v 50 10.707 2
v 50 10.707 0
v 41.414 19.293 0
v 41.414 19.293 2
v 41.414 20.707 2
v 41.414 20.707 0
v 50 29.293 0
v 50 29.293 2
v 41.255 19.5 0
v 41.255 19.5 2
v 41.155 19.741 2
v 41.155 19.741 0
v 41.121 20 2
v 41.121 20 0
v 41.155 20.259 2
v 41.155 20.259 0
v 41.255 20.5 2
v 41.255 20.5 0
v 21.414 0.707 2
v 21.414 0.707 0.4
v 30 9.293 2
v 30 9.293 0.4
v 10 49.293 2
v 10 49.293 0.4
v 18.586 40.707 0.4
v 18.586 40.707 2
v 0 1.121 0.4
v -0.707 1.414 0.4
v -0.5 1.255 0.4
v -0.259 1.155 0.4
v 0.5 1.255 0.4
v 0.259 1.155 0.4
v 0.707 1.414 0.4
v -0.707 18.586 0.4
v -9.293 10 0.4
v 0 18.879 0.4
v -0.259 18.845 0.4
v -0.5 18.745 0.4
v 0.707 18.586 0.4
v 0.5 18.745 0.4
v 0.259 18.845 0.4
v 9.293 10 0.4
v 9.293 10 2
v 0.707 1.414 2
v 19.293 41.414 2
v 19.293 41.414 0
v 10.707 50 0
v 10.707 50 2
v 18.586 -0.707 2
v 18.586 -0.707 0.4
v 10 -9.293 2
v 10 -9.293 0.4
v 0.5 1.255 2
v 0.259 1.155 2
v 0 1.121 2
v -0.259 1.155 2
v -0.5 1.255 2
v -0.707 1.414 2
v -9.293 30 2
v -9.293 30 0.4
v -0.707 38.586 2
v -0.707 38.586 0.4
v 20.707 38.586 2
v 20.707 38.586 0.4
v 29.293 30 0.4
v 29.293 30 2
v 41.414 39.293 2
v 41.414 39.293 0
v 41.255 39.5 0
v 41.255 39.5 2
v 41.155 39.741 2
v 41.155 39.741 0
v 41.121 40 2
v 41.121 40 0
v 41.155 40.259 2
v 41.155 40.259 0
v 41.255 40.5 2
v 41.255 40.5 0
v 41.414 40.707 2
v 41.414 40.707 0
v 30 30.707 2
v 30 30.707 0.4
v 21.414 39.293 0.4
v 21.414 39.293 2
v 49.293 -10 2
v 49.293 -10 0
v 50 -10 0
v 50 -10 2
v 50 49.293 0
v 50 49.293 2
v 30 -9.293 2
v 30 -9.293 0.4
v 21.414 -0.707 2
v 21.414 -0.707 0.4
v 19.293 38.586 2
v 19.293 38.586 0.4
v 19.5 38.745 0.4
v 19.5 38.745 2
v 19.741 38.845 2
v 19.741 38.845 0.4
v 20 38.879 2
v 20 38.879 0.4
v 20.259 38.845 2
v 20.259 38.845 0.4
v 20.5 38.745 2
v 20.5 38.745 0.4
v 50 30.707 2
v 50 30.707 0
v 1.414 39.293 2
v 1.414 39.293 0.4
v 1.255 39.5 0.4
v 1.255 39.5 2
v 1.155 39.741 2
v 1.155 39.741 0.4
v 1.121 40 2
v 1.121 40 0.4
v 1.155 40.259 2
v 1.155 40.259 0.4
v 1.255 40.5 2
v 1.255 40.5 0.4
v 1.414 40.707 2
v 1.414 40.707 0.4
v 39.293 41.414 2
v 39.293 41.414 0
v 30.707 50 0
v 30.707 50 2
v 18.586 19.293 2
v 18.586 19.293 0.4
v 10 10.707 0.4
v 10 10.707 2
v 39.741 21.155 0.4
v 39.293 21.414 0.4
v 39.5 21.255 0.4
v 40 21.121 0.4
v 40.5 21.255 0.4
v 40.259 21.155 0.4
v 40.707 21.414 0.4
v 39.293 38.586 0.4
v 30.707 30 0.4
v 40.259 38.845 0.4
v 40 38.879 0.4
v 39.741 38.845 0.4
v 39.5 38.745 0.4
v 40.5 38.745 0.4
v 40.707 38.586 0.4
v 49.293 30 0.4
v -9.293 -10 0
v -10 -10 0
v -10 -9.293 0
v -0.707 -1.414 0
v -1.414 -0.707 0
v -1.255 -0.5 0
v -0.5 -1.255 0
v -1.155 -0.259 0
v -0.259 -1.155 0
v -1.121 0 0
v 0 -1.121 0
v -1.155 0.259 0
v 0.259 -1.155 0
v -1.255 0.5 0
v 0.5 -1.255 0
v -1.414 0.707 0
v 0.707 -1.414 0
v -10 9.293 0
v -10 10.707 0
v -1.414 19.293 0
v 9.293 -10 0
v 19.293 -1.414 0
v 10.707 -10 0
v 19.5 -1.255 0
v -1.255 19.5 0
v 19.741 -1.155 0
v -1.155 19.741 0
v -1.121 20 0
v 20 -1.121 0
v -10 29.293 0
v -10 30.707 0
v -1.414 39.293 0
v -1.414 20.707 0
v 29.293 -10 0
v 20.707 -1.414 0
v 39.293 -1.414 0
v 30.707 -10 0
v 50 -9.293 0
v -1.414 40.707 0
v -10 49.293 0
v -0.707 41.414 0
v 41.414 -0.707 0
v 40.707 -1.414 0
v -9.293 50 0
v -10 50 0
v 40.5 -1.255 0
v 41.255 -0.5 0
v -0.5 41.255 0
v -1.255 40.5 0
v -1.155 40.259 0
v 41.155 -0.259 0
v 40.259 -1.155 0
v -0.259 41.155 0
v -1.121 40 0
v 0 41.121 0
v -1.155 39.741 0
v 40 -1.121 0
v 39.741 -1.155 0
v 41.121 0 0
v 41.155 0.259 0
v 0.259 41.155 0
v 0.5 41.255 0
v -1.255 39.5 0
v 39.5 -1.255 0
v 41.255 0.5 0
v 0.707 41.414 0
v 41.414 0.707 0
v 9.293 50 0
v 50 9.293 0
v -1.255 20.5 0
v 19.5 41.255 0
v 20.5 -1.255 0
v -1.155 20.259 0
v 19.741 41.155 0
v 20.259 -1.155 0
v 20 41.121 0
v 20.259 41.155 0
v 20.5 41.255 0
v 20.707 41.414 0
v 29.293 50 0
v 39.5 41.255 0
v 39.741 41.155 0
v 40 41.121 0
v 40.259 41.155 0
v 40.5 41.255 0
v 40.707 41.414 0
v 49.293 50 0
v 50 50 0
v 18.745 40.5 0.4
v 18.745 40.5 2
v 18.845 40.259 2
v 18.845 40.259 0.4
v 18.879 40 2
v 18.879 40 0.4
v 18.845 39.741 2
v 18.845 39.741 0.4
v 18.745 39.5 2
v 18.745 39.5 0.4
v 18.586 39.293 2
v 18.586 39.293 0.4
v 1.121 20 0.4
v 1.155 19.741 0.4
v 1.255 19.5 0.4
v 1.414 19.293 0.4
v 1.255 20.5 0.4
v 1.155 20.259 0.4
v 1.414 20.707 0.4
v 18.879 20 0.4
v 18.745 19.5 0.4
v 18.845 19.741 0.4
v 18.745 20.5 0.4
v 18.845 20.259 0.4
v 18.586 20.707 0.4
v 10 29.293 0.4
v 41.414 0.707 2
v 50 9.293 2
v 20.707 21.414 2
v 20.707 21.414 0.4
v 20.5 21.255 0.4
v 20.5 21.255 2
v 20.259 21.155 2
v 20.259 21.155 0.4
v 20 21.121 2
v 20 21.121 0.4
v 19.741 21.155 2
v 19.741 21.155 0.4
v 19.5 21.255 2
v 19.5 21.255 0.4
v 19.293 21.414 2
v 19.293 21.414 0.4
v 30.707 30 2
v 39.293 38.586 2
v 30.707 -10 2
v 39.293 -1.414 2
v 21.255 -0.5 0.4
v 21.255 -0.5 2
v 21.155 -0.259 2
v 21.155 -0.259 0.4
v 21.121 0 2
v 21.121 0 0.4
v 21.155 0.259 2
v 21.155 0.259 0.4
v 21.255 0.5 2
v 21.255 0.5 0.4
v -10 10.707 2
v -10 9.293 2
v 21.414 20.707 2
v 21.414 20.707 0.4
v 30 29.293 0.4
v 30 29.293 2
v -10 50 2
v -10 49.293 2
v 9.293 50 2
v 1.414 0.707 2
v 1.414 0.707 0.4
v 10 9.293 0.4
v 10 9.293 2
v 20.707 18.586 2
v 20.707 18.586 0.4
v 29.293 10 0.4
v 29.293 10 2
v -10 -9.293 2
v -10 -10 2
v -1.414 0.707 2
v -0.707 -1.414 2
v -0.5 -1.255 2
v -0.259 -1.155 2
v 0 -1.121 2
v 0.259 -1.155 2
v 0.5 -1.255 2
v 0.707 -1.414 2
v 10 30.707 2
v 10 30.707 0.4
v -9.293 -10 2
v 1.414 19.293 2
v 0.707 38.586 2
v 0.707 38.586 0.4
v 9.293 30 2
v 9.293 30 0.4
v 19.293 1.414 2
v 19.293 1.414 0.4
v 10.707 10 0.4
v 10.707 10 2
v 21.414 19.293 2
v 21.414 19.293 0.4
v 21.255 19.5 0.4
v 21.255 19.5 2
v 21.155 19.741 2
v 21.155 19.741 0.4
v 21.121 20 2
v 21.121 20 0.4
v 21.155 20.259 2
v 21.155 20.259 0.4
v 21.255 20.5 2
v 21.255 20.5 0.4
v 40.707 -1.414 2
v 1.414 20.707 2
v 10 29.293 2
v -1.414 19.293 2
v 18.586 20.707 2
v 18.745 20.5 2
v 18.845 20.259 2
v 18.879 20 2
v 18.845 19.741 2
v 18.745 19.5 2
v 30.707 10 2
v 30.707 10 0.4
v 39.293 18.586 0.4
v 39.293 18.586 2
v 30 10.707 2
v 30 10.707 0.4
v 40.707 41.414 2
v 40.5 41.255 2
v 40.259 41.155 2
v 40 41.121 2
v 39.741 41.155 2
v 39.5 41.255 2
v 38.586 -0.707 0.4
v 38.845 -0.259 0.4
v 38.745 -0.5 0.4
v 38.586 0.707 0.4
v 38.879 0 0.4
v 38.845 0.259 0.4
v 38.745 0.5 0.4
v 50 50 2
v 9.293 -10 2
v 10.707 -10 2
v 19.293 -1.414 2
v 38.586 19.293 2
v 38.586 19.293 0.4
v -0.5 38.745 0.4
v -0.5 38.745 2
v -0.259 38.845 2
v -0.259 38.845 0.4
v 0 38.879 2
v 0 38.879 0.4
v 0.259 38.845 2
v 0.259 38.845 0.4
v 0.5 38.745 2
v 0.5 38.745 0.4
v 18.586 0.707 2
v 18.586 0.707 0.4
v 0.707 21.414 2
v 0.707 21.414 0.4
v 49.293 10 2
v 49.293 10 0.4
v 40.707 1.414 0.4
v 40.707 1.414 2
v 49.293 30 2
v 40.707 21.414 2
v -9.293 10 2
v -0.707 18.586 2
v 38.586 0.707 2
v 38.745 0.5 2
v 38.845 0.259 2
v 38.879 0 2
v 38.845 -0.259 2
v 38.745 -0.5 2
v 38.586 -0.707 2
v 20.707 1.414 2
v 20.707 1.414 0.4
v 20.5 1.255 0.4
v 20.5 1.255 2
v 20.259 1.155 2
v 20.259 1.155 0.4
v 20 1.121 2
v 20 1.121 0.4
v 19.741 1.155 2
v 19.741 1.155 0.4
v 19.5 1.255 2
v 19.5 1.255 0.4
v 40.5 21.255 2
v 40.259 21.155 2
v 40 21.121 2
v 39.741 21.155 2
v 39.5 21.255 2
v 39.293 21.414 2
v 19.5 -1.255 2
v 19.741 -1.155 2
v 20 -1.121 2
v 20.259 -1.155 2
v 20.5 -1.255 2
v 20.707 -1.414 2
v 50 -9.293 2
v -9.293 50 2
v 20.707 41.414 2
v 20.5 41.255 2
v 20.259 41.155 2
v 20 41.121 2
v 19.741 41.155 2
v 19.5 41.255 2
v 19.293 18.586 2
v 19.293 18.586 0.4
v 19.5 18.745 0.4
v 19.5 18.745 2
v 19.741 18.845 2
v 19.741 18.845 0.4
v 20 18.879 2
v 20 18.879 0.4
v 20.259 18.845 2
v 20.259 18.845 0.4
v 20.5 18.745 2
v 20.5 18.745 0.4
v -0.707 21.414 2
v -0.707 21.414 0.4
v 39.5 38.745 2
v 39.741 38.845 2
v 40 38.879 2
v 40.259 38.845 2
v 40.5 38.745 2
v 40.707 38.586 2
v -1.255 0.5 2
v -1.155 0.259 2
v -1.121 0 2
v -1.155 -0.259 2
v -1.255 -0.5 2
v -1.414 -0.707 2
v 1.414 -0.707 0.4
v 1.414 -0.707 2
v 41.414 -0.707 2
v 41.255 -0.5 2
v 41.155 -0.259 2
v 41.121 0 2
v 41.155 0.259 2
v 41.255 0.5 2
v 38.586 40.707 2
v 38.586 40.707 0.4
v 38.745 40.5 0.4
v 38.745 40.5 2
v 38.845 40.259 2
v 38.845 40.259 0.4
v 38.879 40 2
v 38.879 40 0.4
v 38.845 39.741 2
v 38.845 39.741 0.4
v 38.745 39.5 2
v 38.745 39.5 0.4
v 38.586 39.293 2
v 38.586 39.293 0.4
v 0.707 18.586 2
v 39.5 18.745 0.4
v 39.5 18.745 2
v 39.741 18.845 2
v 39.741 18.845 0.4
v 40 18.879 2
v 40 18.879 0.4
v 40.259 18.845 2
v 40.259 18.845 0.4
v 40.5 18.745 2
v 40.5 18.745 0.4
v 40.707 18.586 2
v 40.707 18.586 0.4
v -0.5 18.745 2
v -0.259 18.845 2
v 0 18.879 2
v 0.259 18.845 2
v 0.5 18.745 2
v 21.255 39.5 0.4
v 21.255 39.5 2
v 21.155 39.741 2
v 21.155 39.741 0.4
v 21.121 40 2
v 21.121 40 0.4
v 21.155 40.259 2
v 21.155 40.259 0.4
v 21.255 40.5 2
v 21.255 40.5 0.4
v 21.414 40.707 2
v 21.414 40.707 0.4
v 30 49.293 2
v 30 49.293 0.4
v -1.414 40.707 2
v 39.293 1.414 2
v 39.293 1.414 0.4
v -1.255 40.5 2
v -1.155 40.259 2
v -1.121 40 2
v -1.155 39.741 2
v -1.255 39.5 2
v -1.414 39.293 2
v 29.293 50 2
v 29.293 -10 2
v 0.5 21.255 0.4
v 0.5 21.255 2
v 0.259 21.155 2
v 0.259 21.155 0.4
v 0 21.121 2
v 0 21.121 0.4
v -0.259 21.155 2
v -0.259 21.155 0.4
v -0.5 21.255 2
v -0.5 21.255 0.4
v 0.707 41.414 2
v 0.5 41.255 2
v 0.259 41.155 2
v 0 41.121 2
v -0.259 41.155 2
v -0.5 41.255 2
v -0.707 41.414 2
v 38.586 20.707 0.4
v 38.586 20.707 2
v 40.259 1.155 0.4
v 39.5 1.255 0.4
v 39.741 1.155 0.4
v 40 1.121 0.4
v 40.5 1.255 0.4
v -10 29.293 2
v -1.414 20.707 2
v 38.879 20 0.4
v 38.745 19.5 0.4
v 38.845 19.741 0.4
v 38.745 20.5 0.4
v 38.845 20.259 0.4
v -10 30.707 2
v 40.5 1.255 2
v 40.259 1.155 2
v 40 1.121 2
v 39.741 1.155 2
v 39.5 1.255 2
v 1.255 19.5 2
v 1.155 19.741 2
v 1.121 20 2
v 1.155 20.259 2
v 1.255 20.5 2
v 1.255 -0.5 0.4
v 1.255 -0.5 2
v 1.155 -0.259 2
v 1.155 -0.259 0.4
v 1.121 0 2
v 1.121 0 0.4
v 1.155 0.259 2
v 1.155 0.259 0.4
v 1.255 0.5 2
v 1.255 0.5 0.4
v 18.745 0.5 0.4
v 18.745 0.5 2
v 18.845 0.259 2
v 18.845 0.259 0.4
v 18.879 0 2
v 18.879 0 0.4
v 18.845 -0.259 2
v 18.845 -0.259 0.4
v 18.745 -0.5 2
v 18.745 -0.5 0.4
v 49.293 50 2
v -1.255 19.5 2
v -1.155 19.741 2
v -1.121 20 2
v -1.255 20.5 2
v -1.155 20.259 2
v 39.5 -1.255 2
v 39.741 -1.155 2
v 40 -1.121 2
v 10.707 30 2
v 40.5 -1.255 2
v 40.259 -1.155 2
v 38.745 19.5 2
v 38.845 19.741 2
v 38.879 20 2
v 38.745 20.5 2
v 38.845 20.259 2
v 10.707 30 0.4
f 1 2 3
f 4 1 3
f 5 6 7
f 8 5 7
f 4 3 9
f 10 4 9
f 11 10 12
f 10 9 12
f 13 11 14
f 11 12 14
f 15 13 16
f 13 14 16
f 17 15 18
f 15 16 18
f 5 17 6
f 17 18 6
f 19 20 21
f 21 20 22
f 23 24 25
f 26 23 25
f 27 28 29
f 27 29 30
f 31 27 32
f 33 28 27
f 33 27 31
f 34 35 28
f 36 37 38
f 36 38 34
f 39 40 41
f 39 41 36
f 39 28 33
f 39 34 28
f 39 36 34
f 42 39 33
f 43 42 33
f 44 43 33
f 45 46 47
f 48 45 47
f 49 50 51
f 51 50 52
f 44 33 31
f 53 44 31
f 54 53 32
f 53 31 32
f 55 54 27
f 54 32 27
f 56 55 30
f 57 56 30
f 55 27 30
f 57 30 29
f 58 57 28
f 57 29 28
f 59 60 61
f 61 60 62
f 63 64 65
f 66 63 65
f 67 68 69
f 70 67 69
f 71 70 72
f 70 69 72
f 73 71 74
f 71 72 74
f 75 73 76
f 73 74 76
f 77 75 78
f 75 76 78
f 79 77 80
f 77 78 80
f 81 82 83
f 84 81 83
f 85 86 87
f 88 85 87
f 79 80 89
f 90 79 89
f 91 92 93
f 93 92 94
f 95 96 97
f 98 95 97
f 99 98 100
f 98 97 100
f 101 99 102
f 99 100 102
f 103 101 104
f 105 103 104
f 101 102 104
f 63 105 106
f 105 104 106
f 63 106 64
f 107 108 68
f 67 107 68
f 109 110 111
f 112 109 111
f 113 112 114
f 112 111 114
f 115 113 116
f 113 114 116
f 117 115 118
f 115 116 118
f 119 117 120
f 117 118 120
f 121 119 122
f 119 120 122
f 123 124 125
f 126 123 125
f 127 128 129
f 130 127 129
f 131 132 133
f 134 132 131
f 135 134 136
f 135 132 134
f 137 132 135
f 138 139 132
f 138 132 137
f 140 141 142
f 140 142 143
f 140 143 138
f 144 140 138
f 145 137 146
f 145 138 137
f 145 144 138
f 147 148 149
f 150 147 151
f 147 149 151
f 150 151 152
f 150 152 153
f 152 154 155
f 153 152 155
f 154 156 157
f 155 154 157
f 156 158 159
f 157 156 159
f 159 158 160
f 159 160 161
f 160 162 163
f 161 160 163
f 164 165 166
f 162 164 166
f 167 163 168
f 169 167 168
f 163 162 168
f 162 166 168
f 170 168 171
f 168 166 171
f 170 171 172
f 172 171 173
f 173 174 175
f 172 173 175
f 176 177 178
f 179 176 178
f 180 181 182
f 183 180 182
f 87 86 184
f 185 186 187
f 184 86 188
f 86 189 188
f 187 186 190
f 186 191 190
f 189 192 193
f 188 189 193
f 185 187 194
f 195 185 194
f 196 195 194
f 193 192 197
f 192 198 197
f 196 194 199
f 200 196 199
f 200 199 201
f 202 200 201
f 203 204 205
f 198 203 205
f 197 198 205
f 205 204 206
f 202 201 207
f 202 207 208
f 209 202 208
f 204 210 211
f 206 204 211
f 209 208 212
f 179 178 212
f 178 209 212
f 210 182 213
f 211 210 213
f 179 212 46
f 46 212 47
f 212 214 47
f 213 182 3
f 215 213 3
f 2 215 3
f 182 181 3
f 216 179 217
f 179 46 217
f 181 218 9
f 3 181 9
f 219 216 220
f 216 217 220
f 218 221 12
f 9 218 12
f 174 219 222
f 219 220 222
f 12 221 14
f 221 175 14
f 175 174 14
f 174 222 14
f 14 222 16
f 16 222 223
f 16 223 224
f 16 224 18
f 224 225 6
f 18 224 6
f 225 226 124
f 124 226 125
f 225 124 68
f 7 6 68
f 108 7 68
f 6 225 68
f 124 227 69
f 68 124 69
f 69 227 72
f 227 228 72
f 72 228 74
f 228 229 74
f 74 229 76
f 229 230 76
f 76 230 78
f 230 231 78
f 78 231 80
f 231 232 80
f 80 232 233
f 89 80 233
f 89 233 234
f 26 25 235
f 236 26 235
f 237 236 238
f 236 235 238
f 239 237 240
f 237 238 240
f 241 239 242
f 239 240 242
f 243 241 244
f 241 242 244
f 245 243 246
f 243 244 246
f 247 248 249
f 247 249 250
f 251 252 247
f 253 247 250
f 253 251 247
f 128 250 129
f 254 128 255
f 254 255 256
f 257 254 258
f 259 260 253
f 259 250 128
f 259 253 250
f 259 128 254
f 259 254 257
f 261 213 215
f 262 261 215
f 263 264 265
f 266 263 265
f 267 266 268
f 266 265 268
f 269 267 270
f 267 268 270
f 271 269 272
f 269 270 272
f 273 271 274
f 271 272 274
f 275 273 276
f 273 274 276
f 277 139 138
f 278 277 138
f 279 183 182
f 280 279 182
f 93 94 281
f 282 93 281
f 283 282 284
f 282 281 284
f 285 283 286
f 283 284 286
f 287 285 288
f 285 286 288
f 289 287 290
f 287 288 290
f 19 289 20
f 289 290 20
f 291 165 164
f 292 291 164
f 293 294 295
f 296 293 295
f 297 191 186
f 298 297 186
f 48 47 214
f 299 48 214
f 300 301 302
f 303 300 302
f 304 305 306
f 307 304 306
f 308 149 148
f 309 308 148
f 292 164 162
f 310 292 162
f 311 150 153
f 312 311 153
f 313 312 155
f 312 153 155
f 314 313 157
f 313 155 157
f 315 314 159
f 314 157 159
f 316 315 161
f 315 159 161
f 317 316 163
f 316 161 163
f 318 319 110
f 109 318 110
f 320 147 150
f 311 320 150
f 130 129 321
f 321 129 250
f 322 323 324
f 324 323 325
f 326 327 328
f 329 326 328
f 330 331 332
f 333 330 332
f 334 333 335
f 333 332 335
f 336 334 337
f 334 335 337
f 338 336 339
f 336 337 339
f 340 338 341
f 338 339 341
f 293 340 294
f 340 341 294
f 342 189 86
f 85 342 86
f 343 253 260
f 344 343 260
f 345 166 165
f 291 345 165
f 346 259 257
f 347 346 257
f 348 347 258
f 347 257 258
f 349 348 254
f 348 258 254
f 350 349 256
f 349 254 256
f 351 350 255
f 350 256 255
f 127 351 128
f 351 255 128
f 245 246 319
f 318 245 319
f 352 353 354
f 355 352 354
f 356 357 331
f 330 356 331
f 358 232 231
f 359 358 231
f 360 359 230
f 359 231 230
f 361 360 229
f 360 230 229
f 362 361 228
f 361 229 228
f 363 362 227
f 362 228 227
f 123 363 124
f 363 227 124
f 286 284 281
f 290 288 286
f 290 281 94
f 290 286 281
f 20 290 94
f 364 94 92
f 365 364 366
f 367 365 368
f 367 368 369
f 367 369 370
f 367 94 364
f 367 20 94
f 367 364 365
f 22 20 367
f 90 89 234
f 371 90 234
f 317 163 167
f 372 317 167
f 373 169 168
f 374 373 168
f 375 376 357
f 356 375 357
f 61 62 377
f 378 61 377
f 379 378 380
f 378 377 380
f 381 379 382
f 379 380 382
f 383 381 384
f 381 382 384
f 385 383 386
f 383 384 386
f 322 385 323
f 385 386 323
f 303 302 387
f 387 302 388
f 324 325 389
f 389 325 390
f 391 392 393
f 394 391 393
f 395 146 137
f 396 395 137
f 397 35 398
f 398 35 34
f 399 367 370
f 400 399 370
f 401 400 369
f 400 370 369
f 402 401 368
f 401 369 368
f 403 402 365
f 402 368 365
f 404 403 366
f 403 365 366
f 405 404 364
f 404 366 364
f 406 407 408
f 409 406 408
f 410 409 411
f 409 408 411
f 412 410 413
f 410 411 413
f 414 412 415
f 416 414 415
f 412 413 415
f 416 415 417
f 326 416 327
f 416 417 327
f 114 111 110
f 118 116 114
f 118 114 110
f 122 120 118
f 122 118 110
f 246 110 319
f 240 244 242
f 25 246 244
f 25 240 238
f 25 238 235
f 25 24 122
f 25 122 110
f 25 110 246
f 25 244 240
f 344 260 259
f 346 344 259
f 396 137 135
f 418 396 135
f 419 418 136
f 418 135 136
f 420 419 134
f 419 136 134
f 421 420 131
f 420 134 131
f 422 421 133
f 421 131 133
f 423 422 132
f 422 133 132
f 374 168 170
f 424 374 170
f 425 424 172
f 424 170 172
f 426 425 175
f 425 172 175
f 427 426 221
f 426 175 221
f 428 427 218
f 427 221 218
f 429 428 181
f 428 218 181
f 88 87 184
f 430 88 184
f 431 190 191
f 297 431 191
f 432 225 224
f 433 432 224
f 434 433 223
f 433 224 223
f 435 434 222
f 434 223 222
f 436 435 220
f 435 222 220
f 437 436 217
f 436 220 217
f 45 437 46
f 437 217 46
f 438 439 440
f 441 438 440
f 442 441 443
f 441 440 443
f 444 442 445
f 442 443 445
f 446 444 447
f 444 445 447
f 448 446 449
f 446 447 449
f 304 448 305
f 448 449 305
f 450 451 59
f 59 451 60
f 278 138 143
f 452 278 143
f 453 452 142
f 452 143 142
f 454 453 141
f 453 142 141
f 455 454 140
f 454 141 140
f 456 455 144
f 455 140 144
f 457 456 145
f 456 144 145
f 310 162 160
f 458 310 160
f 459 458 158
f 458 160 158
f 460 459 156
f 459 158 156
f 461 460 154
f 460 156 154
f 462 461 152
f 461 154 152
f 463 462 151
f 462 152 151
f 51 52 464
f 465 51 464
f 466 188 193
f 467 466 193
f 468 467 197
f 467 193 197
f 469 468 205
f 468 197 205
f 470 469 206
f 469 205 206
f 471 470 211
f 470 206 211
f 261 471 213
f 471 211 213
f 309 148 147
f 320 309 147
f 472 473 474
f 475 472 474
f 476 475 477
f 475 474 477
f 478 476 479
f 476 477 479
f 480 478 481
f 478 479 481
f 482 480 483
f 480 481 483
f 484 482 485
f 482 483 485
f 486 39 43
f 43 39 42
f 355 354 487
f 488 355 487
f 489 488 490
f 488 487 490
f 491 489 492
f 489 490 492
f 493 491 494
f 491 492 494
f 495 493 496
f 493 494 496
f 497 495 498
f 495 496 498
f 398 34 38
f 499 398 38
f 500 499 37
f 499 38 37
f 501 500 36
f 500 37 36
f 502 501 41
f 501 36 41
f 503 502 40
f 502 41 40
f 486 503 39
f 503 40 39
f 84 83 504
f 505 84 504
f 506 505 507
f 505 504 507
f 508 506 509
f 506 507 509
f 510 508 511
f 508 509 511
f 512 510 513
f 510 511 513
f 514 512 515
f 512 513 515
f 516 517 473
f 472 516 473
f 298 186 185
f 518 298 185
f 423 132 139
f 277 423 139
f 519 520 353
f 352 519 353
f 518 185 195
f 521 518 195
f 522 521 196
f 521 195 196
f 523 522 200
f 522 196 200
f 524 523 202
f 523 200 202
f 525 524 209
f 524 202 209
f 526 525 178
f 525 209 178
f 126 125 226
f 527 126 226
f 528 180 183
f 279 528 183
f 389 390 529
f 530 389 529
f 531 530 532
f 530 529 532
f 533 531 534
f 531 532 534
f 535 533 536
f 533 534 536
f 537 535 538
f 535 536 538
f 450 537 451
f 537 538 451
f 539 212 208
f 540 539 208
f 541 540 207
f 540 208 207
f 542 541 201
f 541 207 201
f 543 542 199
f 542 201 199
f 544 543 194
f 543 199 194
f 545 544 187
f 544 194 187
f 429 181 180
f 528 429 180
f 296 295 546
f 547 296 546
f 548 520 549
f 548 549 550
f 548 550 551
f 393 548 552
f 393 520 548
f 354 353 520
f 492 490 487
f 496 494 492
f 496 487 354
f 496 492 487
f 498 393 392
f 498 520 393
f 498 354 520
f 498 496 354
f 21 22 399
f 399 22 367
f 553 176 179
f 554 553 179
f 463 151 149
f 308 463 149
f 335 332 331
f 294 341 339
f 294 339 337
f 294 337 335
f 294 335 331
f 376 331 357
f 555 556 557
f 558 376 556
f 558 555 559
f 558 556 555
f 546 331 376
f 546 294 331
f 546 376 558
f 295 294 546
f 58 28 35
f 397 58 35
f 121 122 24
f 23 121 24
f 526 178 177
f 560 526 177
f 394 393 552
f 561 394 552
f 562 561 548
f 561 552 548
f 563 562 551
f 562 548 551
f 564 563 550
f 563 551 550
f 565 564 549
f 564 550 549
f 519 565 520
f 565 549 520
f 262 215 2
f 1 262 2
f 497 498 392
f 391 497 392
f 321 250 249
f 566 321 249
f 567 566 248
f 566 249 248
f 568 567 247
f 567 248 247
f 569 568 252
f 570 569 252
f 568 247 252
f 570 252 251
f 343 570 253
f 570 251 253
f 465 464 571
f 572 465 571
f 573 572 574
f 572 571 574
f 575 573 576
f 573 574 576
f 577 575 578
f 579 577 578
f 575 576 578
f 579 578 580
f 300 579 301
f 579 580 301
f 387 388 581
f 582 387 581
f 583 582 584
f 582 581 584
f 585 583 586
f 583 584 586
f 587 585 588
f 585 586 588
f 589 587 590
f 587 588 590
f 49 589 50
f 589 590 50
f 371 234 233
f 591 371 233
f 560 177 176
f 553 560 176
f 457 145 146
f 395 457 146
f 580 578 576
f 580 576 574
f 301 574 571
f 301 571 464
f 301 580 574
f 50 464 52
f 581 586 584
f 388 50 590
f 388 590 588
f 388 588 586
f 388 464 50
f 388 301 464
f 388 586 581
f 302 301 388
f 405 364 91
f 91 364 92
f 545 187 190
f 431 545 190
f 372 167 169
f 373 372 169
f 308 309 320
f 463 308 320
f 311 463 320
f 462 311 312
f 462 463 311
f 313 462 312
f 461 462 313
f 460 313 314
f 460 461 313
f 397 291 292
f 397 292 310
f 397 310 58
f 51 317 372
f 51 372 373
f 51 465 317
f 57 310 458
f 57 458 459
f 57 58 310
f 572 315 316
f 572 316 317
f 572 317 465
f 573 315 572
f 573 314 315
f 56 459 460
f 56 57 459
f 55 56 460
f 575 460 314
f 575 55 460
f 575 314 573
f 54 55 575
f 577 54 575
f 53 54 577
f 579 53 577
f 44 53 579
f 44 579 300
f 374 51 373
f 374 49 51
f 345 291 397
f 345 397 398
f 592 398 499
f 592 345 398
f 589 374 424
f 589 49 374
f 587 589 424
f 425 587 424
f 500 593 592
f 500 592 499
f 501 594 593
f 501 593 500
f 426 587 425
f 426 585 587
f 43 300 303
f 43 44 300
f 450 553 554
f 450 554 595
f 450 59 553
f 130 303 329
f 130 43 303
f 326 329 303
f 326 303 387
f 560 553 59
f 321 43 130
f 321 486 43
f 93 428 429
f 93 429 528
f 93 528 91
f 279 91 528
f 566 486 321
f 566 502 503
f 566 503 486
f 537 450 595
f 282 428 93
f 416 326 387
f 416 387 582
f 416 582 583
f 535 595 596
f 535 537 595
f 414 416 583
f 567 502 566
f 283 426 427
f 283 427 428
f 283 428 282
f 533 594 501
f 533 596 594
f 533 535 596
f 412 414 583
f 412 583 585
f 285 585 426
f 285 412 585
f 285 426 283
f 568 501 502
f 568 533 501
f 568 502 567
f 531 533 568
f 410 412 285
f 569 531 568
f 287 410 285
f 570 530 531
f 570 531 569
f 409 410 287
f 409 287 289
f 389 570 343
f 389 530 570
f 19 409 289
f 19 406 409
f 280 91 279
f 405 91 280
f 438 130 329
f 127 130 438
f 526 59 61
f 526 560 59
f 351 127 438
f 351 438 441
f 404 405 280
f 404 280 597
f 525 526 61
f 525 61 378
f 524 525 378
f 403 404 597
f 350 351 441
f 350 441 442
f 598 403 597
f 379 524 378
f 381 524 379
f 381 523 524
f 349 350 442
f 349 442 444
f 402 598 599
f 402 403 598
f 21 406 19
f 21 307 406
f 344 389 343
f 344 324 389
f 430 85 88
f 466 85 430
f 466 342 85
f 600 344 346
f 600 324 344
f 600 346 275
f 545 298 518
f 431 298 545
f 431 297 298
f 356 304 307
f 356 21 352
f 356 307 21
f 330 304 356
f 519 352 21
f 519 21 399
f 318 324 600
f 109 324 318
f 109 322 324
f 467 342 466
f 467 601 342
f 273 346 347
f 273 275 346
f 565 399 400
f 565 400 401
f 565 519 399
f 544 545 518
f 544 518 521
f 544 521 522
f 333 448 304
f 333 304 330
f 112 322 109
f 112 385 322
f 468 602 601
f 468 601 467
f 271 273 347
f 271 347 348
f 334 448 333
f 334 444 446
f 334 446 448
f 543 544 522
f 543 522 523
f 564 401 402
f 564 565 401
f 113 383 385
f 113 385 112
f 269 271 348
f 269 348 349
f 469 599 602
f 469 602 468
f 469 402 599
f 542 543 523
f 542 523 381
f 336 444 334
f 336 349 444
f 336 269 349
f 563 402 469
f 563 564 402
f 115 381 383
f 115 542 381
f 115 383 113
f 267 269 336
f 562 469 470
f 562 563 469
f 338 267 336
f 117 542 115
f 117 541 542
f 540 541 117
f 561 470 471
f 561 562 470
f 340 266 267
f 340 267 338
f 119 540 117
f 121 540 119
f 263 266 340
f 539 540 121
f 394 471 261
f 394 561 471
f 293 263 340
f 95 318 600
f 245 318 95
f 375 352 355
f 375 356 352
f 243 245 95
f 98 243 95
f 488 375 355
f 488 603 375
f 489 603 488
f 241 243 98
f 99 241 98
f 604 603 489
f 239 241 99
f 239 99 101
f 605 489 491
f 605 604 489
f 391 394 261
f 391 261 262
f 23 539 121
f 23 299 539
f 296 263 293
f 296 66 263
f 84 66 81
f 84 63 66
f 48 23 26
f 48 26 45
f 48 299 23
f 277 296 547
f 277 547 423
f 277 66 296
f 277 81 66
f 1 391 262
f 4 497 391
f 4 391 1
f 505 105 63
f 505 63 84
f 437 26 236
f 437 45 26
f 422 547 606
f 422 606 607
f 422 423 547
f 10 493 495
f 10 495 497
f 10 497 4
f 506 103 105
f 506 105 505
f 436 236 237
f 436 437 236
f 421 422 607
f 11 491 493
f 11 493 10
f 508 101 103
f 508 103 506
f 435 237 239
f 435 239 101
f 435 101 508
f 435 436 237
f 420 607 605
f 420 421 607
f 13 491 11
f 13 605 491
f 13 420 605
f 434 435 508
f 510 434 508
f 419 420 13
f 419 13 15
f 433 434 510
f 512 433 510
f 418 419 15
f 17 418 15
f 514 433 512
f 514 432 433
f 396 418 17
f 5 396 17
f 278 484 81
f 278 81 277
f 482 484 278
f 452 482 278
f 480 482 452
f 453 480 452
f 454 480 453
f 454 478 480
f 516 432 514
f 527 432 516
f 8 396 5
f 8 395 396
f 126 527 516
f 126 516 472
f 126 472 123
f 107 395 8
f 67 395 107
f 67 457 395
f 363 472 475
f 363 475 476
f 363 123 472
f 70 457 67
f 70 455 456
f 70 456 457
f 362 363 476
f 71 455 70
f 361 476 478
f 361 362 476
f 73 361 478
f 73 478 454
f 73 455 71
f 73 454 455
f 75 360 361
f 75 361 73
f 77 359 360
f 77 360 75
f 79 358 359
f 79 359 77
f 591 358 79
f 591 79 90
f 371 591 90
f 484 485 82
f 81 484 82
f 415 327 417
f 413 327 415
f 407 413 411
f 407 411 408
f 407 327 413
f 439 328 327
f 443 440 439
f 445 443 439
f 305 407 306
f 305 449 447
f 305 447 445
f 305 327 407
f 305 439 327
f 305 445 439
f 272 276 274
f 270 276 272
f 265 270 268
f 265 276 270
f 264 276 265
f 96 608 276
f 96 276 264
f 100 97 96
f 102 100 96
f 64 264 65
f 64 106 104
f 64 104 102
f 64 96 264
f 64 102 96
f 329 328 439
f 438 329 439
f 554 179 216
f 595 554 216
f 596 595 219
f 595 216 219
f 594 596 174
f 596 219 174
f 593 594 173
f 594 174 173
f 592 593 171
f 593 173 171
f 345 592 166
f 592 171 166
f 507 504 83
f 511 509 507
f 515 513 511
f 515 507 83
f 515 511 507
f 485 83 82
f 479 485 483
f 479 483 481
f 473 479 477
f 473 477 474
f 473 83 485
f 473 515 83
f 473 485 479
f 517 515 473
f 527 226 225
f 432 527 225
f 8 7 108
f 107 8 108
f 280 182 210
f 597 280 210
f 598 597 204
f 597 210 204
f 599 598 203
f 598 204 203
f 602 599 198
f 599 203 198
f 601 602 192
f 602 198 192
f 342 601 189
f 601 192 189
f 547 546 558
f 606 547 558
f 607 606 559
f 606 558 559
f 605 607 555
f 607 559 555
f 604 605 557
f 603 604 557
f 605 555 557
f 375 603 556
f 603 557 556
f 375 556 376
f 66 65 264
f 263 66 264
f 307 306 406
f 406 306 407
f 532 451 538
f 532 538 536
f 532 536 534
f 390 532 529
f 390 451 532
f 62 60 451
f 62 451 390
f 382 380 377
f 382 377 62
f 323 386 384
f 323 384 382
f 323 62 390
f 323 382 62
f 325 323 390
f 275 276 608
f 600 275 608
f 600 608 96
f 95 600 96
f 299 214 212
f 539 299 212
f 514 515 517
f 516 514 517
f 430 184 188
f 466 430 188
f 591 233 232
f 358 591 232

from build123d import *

# Parameters (mm, degrees)
F1_DEPTH = 2
F2_DEPTH = 0.4


with BuildPart() as f1:
    # F0 (on Top) → F1 (new body)
    with BuildSketch(Plane.XY):
        with BuildLine():
            ThreePointArc((-1.414214, 0.707107), (-1.12132, 0), (-1.414214, -0.707107))
            Line((-1.414214, -0.707107), (-10, -9.292893))
            Line((-10, -9.292893), (-10, -10))
            Line((-10, -10), (-9.292893, -10))
            Line((-9.292893, -10), (-0.707107, -1.414214))
            ThreePointArc((-0.707107, -1.414214), (0, -1.12132), (0.707107, -1.414214))
            Line((0.707107, -1.414214), (9.292893, -10))
            Line((9.292893, -10), (10, -10))
            Line((10, -10), (10, -9.292893))
            Line((10, -9.292893), (1.414214, -0.707107))
            ThreePointArc((1.414214, -0.707107), (1.12132, 0), (1.414214, 0.707107))
            Line((1.414214, 0.707107), (10, 9.292893))
            Line((10, 9.292893), (10, 10))
            Line((10, 10), (9.292893, 10))
            Line((9.292893, 10), (0.707107, 1.414214))
            ThreePointArc((0.707107, 1.414214), (0, 1.12132), (-0.707107, 1.414214))
            Line((-0.707107, 1.414214), (-9.292893, 10))
            Line((-9.292893, 10), (-10, 10))
            Line((-10, 10), (-10, 9.292893))
            Line((-10, 9.292893), (-1.414214, 0.707107))
        make_face()
        with BuildLine():
            Line((10, 10.707107), (10, 10))
            Line((10, 10), (10.707107, 10))
            Line((10.707107, 10), (19.292893, 18.585786))
            ThreePointArc((19.292893, 18.585786), (20, 18.87868), (20.707107, 18.585786))
            Line((20.707107, 18.585786), (29.292893, 10))
            Line((29.292893, 10), (30, 10))
            Line((30, 10), (30, 10.707107))
            Line((30, 10.707107), (21.414214, 19.292893))
            ThreePointArc((21.414214, 19.292893), (21.12132, 20), (21.414214, 20.707107))
            Line((21.414214, 20.707107), (30, 29.292893))
            Line((30, 29.292893), (30, 30))
            Line((30, 30), (29.292893, 30))
            Line((29.292893, 30), (20.707107, 21.414214))
            ThreePointArc((20.707107, 21.414214), (20, 21.12132), (19.292893, 21.414214))
            Line((19.292893, 21.414214), (10.707107, 30))
            Line((10.707107, 30), (10, 30))
            Line((10, 30), (10, 29.292893))
            Line((10, 29.292893), (18.585786, 20.707107))
            ThreePointArc((18.585786, 20.707107), (18.87868, 20), (18.585786, 19.292893))
            Line((18.585786, 19.292893), (10, 10.707107))
        make_face()
        with BuildLine():
            Line((10, -9.292893), (10, -10))
            Line((10, -10), (10.707107, -10))
            Line((10.707107, -10), (19.292893, -1.414214))
            ThreePointArc((19.292893, -1.414214), (20, -1.12132), (20.707107, -1.414214))
            Line((20.707107, -1.414214), (29.292893, -10))
            Line((29.292893, -10), (30, -10))
            Line((30, -10), (30, -9.292893))
            Line((30, -9.292893), (21.414214, -0.707107))
            ThreePointArc((21.414214, -0.707107), (21.12132, 0), (21.414214, 0.707107))
            Line((21.414214, 0.707107), (30, 9.292893))
            Line((30, 9.292893), (30, 10))
            Line((30, 10), (29.292893, 10))
            Line((29.292893, 10), (20.707107, 1.414214))
            ThreePointArc((20.707107, 1.414214), (20, 1.12132), (19.292893, 1.414214))
            Line((19.292893, 1.414214), (10.707107, 10))
            Line((10.707107, 10), (10, 10))
            Line((10, 10), (10, 9.292893))
            Line((10, 9.292893), (18.585786, 0.707107))
            ThreePointArc((18.585786, 0.707107), (18.87868, 0), (18.585786, -0.707107))
            Line((18.585786, -0.707107), (10, -9.292893))
        make_face()
        with BuildLine():
            Line((-10, 10.707107), (-10, 10))
            Line((-10, 10), (-9.292893, 10))
            Line((-9.292893, 10), (-0.707107, 18.585786))
            ThreePointArc((-0.707107, 18.585786), (0, 18.87868), (0.707107, 18.585786))
            Line((0.707107, 18.585786), (9.292893, 10))
            Line((9.292893, 10), (10, 10))
            Line((10, 10), (10, 10.707107))
            Line((10, 10.707107), (1.414214, 19.292893))
            ThreePointArc((1.414214, 19.292893), (1.12132, 20), (1.414214, 20.707107))
            Line((1.414214, 20.707107), (10, 29.292893))
            Line((10, 29.292893), (10, 30))
            Line((10, 30), (9.292893, 30))
            Line((9.292893, 30), (0.707107, 21.414214))
            ThreePointArc((0.707107, 21.414214), (0, 21.12132), (-0.707107, 21.414214))
            Line((-0.707107, 21.414214), (-9.292893, 30))
            Line((-9.292893, 30), (-10, 30))
            Line((-10, 30), (-10, 29.292893))
            Line((-10, 29.292893), (-1.414214, 20.707107))
            ThreePointArc((-1.414214, 20.707107), (-1.12132, 20), (-1.414214, 19.292893))
            Line((-1.414214, 19.292893), (-10, 10.707107))
        make_face()
        with BuildLine():
            Line((30, 10.707107), (30, 10))
            Line((30, 10), (30.707107, 10))
            Line((30.707107, 10), (39.292893, 18.585786))
            ThreePointArc((39.292893, 18.585786), (40, 18.87868), (40.707107, 18.585786))
            Line((40.707107, 18.585786), (49.292893, 10))
            Line((49.292893, 10), (50, 10))
            Line((50, 10), (50, 10.707107))
            Line((50, 10.707107), (41.414214, 19.292893))
            ThreePointArc((41.414214, 19.292893), (41.12132, 20), (41.414214, 20.707107))
            Line((41.414214, 20.707107), (50, 29.292893))
            Line((50, 29.292893), (50, 30))
            Line((50, 30), (49.292893, 30))
            Line((49.292893, 30), (40.707107, 21.414214))
            ThreePointArc((40.707107, 21.414214), (40, 21.12132), (39.292893, 21.414214))
            Line((39.292893, 21.414214), (30.707107, 30))
            Line((30.707107, 30), (30, 30))
            Line((30, 30), (30, 29.292893))
            Line((30, 29.292893), (38.585786, 20.707107))
            ThreePointArc((38.585786, 20.707107), (38.87868, 20), (38.585786, 19.292893))
            Line((38.585786, 19.292893), (30, 10.707107))
        make_face()
        with BuildLine():
            Line((30, -9.292893), (30, -10))
            Line((30, -10), (30.707107, -10))
            Line((30.707107, -10), (39.292893, -1.414214))
            ThreePointArc((39.292893, -1.414214), (40, -1.12132), (40.707107, -1.414214))
            Line((40.707107, -1.414214), (49.292893, -10))
            Line((49.292893, -10), (50, -10))
            Line((50, -10), (50, -9.292893))
            Line((50, -9.292893), (41.414214, -0.707107))
            ThreePointArc((41.414214, -0.707107), (41.12132, 0), (41.414214, 0.707107))
            Line((41.414214, 0.707107), (50, 9.292893))
            Line((50, 9.292893), (50, 10))
            Line((50, 10), (49.292893, 10))
            Line((49.292893, 10), (40.707107, 1.414214))
            ThreePointArc((40.707107, 1.414214), (40, 1.12132), (39.292893, 1.414214))
            Line((39.292893, 1.414214), (30.707107, 10))
            Line((30.707107, 10), (30, 10))
            Line((30, 10), (30, 9.292893))
            Line((30, 9.292893), (38.585786, 0.707107))
            ThreePointArc((38.585786, 0.707107), (38.87868, 0), (38.585786, -0.707107))
            Line((38.585786, -0.707107), (30, -9.292893))
        make_face()
        with BuildLine():
            Line((30, 30.707107), (30, 30))
            Line((30, 30), (30.707107, 30))
            Line((30.707107, 30), (39.292893, 38.585786))
            ThreePointArc((39.292893, 38.585786), (40, 38.87868), (40.707107, 38.585786))
            Line((40.707107, 38.585786), (49.292893, 30))
            Line((49.292893, 30), (50, 30))
            Line((50, 30), (50, 30.707107))
            Line((50, 30.707107), (41.414214, 39.292893))
            ThreePointArc((41.414214, 39.292893), (41.12132, 40), (41.414214, 40.707107))
            Line((41.414214, 40.707107), (50, 49.292893))
            Line((50, 49.292893), (50, 50))
            Line((50, 50), (49.292893, 50))
            Line((49.292893, 50), (40.707107, 41.414214))
            ThreePointArc((40.707107, 41.414214), (40, 41.12132), (39.292893, 41.414214))
            Line((39.292893, 41.414214), (30.707107, 50))
            Line((30.707107, 50), (30, 50))
            Line((30, 50), (30, 49.292893))
            Line((30, 49.292893), (38.585786, 40.707107))
            ThreePointArc((38.585786, 40.707107), (38.87868, 40), (38.585786, 39.292893))
            Line((38.585786, 39.292893), (30, 30.707107))
        make_face()
        with BuildLine():
            Line((10, 30.707107), (10, 30))
            Line((10, 30), (10.707107, 30))
            Line((10.707107, 30), (19.292893, 38.585786))
            ThreePointArc((19.292893, 38.585786), (20, 38.87868), (20.707107, 38.585786))
            Line((20.707107, 38.585786), (29.292893, 30))
            Line((29.292893, 30), (30, 30))
            Line((30, 30), (30, 30.707107))
            Line((30, 30.707107), (21.414214, 39.292893))
            ThreePointArc((21.414214, 39.292893), (21.12132, 40), (21.414214, 40.707107))
            Line((21.414214, 40.707107), (30, 49.292893))
            Line((30, 49.292893), (30, 50))
            Line((30, 50), (29.292893, 50))
            Line((29.292893, 50), (20.707107, 41.414214))
            ThreePointArc((20.707107, 41.414214), (20, 41.12132), (19.292893, 41.414214))
            Line((19.292893, 41.414214), (10.707107, 50))
            Line((10.707107, 50), (10, 50))
            Line((10, 50), (10, 49.292893))
            Line((10, 49.292893), (18.585786, 40.707107))
            ThreePointArc((18.585786, 40.707107), (18.87868, 40), (18.585786, 39.292893))
            Line((18.585786, 39.292893), (10, 30.707107))
        make_face()
        with BuildLine():
            Line((-10, 30.707107), (-10, 30))
            Line((-10, 30), (-9.292893, 30))
            Line((-9.292893, 30), (-0.707107, 38.585786))
            ThreePointArc((-0.707107, 38.585786), (0, 38.87868), (0.707107, 38.585786))
            Line((0.707107, 38.585786), (9.292893, 30))
            Line((9.292893, 30), (10, 30))
            Line((10, 30), (10, 30.707107))
            Line((10, 30.707107), (1.414214, 39.292893))
            ThreePointArc((1.414214, 39.292893), (1.12132, 40), (1.414214, 40.707107))
            Line((1.414214, 40.707107), (10, 49.292893))
            Line((10, 49.292893), (10, 50))
            Line((10, 50), (9.292893, 50))
            Line((9.292893, 50), (0.707107, 41.414214))
            ThreePointArc((0.707107, 41.414214), (0, 41.12132), (-0.707107, 41.414214))
            Line((-0.707107, 41.414214), (-9.292893, 50))
            Line((-9.292893, 50), (-10, 50))
            Line((-10, 50), (-10, 49.292893))
            Line((-10, 49.292893), (-1.414214, 40.707107))
            ThreePointArc((-1.414214, 40.707107), (-1.12132, 40), (-1.414214, 39.292893))
            Line((-1.414214, 39.292893), (-10, 30.707107))
        make_face()
    extrude(amount=F1_DEPTH)

    # F0 (on Top) → F2 (join)
    with BuildSketch(Plane.XY):
        with BuildLine():
            Line((-0.707107, 18.585786), (-9.292893, 10))
            Line((-9.292893, 10), (-0.707107, 1.414214))
            ThreePointArc((-0.707107, 1.414214), (0, 1.12132), (0.707107, 1.414214))
            Line((0.707107, 1.414214), (9.292893, 10))
            Line((9.292893, 10), (0.707107, 18.585786))
            ThreePointArc((0.707107, 18.585786), (0, 18.87868), (-0.707107, 18.585786))
        make_face()
        with BuildLine():
            Line((1.414214, -0.707107), (10, -9.292893))
            Line((10, -9.292893), (18.585786, -0.707107))
            ThreePointArc((18.585786, -0.707107), (18.87868, 0), (18.585786, 0.707107))
            Line((18.585786, 0.707107), (10, 9.292893))
            Line((10, 9.292893), (1.414214, 0.707107))
            ThreePointArc((1.414214, 0.707107), (1.12132, 0), (1.414214, -0.707107))
        make_face()
        with BuildLine():
            Line((1.414214, 19.292893), (10, 10.707107))
            Line((10, 10.707107), (18.585786, 19.292893))
            ThreePointArc((18.585786, 19.292893), (18.87868, 20), (18.585786, 20.707107))
            Line((18.585786, 20.707107), (10, 29.292893))
            Line((10, 29.292893), (1.414214, 20.707107))
            ThreePointArc((1.414214, 20.707107), (1.12132, 20), (1.414214, 19.292893))
        make_face()
        with BuildLine():
            Line((19.292893, 18.585786), (10.707107, 10))
            Line((10.707107, 10), (19.292893, 1.414214))
            ThreePointArc((19.292893, 1.414214), (20, 1.12132), (20.707107, 1.414214))
            Line((20.707107, 1.414214), (29.292893, 10))
            Line((29.292893, 10), (20.707107, 18.585786))
            ThreePointArc((20.707107, 18.585786), (20, 18.87868), (19.292893, 18.585786))
        make_face()
        with BuildLine():
            Line((21.414214, -0.707107), (30, -9.292893))
            Line((30, -9.292893), (38.585786, -0.707107))
            ThreePointArc((38.585786, -0.707107), (38.87868, 0), (38.585786, 0.707107))
            Line((38.585786, 0.707107), (30, 9.292893))
            Line((30, 9.292893), (21.414214, 0.707107))
            ThreePointArc((21.414214, 0.707107), (21.12132, 0), (21.414214, -0.707107))
        make_face()
        with BuildLine():
            Line((21.414214, 19.292893), (30, 10.707107))
            Line((30, 10.707107), (38.585786, 19.292893))
            ThreePointArc((38.585786, 19.292893), (38.87868, 20), (38.585786, 20.707107))
            Line((38.585786, 20.707107), (30, 29.292893))
            Line((30, 29.292893), (21.414214, 20.707107))
            ThreePointArc((21.414214, 20.707107), (21.12132, 20), (21.414214, 19.292893))
        make_face()
        with BuildLine():
            Line((39.292893, 18.585786), (30.707107, 10))
            Line((30.707107, 10), (39.292893, 1.414214))
            ThreePointArc((39.292893, 1.414214), (40, 1.12132), (40.707107, 1.414214))
            Line((40.707107, 1.414214), (49.292893, 10))
            Line((49.292893, 10), (40.707107, 18.585786))
            ThreePointArc((40.707107, 18.585786), (40, 18.87868), (39.292893, 18.585786))
        make_face()
        with BuildLine():
            Line((19.292893, 38.585786), (10.707107, 30))
            Line((10.707107, 30), (19.292893, 21.414214))
            ThreePointArc((19.292893, 21.414214), (20, 21.12132), (20.707107, 21.414214))
            Line((20.707107, 21.414214), (29.292893, 30))
            Line((29.292893, 30), (20.707107, 38.585786))
            ThreePointArc((20.707107, 38.585786), (20, 38.87868), (19.292893, 38.585786))
        make_face()
        with BuildLine():
            Line((1.414214, 39.292893), (10, 30.707107))
            Line((10, 30.707107), (18.585786, 39.292893))
            ThreePointArc((18.585786, 39.292893), (18.87868, 40), (18.585786, 40.707107))
            Line((18.585786, 40.707107), (10, 49.292893))
            Line((10, 49.292893), (1.414214, 40.707107))
            ThreePointArc((1.414214, 40.707107), (1.12132, 40), (1.414214, 39.292893))
        make_face()
        with BuildLine():
            Line((-0.707107, 38.585786), (-9.292893, 30))
            Line((-9.292893, 30), (-0.707107, 21.414214))
            ThreePointArc((-0.707107, 21.414214), (0, 21.12132), (0.707107, 21.414214))
            Line((0.707107, 21.414214), (9.292893, 30))
            Line((9.292893, 30), (0.707107, 38.585786))
            ThreePointArc((0.707107, 38.585786), (0, 38.87868), (-0.707107, 38.585786))
        make_face()
        with BuildLine():
            Line((21.414214, 39.292893), (30, 30.707107))
            Line((30, 30.707107), (38.585786, 39.292893))
            ThreePointArc((38.585786, 39.292893), (38.87868, 40), (38.585786, 40.707107))
            Line((38.585786, 40.707107), (30, 49.292893))
            Line((30, 49.292893), (21.414214, 40.707107))
            ThreePointArc((21.414214, 40.707107), (21.12132, 40), (21.414214, 39.292893))
        make_face()
        with BuildLine():
            Line((39.292893, 38.585786), (30.707107, 30))
            Line((30.707107, 30), (39.292893, 21.414214))
            ThreePointArc((39.292893, 21.414214), (40, 21.12132), (40.707107, 21.414214))
            Line((40.707107, 21.414214), (49.292893, 30))
            Line((49.292893, 30), (40.707107, 38.585786))
            ThreePointArc((40.707107, 38.585786), (40, 38.87868), (39.292893, 38.585786))
        make_face()
    extrude(amount=F2_DEPTH)


solid = f1.part
